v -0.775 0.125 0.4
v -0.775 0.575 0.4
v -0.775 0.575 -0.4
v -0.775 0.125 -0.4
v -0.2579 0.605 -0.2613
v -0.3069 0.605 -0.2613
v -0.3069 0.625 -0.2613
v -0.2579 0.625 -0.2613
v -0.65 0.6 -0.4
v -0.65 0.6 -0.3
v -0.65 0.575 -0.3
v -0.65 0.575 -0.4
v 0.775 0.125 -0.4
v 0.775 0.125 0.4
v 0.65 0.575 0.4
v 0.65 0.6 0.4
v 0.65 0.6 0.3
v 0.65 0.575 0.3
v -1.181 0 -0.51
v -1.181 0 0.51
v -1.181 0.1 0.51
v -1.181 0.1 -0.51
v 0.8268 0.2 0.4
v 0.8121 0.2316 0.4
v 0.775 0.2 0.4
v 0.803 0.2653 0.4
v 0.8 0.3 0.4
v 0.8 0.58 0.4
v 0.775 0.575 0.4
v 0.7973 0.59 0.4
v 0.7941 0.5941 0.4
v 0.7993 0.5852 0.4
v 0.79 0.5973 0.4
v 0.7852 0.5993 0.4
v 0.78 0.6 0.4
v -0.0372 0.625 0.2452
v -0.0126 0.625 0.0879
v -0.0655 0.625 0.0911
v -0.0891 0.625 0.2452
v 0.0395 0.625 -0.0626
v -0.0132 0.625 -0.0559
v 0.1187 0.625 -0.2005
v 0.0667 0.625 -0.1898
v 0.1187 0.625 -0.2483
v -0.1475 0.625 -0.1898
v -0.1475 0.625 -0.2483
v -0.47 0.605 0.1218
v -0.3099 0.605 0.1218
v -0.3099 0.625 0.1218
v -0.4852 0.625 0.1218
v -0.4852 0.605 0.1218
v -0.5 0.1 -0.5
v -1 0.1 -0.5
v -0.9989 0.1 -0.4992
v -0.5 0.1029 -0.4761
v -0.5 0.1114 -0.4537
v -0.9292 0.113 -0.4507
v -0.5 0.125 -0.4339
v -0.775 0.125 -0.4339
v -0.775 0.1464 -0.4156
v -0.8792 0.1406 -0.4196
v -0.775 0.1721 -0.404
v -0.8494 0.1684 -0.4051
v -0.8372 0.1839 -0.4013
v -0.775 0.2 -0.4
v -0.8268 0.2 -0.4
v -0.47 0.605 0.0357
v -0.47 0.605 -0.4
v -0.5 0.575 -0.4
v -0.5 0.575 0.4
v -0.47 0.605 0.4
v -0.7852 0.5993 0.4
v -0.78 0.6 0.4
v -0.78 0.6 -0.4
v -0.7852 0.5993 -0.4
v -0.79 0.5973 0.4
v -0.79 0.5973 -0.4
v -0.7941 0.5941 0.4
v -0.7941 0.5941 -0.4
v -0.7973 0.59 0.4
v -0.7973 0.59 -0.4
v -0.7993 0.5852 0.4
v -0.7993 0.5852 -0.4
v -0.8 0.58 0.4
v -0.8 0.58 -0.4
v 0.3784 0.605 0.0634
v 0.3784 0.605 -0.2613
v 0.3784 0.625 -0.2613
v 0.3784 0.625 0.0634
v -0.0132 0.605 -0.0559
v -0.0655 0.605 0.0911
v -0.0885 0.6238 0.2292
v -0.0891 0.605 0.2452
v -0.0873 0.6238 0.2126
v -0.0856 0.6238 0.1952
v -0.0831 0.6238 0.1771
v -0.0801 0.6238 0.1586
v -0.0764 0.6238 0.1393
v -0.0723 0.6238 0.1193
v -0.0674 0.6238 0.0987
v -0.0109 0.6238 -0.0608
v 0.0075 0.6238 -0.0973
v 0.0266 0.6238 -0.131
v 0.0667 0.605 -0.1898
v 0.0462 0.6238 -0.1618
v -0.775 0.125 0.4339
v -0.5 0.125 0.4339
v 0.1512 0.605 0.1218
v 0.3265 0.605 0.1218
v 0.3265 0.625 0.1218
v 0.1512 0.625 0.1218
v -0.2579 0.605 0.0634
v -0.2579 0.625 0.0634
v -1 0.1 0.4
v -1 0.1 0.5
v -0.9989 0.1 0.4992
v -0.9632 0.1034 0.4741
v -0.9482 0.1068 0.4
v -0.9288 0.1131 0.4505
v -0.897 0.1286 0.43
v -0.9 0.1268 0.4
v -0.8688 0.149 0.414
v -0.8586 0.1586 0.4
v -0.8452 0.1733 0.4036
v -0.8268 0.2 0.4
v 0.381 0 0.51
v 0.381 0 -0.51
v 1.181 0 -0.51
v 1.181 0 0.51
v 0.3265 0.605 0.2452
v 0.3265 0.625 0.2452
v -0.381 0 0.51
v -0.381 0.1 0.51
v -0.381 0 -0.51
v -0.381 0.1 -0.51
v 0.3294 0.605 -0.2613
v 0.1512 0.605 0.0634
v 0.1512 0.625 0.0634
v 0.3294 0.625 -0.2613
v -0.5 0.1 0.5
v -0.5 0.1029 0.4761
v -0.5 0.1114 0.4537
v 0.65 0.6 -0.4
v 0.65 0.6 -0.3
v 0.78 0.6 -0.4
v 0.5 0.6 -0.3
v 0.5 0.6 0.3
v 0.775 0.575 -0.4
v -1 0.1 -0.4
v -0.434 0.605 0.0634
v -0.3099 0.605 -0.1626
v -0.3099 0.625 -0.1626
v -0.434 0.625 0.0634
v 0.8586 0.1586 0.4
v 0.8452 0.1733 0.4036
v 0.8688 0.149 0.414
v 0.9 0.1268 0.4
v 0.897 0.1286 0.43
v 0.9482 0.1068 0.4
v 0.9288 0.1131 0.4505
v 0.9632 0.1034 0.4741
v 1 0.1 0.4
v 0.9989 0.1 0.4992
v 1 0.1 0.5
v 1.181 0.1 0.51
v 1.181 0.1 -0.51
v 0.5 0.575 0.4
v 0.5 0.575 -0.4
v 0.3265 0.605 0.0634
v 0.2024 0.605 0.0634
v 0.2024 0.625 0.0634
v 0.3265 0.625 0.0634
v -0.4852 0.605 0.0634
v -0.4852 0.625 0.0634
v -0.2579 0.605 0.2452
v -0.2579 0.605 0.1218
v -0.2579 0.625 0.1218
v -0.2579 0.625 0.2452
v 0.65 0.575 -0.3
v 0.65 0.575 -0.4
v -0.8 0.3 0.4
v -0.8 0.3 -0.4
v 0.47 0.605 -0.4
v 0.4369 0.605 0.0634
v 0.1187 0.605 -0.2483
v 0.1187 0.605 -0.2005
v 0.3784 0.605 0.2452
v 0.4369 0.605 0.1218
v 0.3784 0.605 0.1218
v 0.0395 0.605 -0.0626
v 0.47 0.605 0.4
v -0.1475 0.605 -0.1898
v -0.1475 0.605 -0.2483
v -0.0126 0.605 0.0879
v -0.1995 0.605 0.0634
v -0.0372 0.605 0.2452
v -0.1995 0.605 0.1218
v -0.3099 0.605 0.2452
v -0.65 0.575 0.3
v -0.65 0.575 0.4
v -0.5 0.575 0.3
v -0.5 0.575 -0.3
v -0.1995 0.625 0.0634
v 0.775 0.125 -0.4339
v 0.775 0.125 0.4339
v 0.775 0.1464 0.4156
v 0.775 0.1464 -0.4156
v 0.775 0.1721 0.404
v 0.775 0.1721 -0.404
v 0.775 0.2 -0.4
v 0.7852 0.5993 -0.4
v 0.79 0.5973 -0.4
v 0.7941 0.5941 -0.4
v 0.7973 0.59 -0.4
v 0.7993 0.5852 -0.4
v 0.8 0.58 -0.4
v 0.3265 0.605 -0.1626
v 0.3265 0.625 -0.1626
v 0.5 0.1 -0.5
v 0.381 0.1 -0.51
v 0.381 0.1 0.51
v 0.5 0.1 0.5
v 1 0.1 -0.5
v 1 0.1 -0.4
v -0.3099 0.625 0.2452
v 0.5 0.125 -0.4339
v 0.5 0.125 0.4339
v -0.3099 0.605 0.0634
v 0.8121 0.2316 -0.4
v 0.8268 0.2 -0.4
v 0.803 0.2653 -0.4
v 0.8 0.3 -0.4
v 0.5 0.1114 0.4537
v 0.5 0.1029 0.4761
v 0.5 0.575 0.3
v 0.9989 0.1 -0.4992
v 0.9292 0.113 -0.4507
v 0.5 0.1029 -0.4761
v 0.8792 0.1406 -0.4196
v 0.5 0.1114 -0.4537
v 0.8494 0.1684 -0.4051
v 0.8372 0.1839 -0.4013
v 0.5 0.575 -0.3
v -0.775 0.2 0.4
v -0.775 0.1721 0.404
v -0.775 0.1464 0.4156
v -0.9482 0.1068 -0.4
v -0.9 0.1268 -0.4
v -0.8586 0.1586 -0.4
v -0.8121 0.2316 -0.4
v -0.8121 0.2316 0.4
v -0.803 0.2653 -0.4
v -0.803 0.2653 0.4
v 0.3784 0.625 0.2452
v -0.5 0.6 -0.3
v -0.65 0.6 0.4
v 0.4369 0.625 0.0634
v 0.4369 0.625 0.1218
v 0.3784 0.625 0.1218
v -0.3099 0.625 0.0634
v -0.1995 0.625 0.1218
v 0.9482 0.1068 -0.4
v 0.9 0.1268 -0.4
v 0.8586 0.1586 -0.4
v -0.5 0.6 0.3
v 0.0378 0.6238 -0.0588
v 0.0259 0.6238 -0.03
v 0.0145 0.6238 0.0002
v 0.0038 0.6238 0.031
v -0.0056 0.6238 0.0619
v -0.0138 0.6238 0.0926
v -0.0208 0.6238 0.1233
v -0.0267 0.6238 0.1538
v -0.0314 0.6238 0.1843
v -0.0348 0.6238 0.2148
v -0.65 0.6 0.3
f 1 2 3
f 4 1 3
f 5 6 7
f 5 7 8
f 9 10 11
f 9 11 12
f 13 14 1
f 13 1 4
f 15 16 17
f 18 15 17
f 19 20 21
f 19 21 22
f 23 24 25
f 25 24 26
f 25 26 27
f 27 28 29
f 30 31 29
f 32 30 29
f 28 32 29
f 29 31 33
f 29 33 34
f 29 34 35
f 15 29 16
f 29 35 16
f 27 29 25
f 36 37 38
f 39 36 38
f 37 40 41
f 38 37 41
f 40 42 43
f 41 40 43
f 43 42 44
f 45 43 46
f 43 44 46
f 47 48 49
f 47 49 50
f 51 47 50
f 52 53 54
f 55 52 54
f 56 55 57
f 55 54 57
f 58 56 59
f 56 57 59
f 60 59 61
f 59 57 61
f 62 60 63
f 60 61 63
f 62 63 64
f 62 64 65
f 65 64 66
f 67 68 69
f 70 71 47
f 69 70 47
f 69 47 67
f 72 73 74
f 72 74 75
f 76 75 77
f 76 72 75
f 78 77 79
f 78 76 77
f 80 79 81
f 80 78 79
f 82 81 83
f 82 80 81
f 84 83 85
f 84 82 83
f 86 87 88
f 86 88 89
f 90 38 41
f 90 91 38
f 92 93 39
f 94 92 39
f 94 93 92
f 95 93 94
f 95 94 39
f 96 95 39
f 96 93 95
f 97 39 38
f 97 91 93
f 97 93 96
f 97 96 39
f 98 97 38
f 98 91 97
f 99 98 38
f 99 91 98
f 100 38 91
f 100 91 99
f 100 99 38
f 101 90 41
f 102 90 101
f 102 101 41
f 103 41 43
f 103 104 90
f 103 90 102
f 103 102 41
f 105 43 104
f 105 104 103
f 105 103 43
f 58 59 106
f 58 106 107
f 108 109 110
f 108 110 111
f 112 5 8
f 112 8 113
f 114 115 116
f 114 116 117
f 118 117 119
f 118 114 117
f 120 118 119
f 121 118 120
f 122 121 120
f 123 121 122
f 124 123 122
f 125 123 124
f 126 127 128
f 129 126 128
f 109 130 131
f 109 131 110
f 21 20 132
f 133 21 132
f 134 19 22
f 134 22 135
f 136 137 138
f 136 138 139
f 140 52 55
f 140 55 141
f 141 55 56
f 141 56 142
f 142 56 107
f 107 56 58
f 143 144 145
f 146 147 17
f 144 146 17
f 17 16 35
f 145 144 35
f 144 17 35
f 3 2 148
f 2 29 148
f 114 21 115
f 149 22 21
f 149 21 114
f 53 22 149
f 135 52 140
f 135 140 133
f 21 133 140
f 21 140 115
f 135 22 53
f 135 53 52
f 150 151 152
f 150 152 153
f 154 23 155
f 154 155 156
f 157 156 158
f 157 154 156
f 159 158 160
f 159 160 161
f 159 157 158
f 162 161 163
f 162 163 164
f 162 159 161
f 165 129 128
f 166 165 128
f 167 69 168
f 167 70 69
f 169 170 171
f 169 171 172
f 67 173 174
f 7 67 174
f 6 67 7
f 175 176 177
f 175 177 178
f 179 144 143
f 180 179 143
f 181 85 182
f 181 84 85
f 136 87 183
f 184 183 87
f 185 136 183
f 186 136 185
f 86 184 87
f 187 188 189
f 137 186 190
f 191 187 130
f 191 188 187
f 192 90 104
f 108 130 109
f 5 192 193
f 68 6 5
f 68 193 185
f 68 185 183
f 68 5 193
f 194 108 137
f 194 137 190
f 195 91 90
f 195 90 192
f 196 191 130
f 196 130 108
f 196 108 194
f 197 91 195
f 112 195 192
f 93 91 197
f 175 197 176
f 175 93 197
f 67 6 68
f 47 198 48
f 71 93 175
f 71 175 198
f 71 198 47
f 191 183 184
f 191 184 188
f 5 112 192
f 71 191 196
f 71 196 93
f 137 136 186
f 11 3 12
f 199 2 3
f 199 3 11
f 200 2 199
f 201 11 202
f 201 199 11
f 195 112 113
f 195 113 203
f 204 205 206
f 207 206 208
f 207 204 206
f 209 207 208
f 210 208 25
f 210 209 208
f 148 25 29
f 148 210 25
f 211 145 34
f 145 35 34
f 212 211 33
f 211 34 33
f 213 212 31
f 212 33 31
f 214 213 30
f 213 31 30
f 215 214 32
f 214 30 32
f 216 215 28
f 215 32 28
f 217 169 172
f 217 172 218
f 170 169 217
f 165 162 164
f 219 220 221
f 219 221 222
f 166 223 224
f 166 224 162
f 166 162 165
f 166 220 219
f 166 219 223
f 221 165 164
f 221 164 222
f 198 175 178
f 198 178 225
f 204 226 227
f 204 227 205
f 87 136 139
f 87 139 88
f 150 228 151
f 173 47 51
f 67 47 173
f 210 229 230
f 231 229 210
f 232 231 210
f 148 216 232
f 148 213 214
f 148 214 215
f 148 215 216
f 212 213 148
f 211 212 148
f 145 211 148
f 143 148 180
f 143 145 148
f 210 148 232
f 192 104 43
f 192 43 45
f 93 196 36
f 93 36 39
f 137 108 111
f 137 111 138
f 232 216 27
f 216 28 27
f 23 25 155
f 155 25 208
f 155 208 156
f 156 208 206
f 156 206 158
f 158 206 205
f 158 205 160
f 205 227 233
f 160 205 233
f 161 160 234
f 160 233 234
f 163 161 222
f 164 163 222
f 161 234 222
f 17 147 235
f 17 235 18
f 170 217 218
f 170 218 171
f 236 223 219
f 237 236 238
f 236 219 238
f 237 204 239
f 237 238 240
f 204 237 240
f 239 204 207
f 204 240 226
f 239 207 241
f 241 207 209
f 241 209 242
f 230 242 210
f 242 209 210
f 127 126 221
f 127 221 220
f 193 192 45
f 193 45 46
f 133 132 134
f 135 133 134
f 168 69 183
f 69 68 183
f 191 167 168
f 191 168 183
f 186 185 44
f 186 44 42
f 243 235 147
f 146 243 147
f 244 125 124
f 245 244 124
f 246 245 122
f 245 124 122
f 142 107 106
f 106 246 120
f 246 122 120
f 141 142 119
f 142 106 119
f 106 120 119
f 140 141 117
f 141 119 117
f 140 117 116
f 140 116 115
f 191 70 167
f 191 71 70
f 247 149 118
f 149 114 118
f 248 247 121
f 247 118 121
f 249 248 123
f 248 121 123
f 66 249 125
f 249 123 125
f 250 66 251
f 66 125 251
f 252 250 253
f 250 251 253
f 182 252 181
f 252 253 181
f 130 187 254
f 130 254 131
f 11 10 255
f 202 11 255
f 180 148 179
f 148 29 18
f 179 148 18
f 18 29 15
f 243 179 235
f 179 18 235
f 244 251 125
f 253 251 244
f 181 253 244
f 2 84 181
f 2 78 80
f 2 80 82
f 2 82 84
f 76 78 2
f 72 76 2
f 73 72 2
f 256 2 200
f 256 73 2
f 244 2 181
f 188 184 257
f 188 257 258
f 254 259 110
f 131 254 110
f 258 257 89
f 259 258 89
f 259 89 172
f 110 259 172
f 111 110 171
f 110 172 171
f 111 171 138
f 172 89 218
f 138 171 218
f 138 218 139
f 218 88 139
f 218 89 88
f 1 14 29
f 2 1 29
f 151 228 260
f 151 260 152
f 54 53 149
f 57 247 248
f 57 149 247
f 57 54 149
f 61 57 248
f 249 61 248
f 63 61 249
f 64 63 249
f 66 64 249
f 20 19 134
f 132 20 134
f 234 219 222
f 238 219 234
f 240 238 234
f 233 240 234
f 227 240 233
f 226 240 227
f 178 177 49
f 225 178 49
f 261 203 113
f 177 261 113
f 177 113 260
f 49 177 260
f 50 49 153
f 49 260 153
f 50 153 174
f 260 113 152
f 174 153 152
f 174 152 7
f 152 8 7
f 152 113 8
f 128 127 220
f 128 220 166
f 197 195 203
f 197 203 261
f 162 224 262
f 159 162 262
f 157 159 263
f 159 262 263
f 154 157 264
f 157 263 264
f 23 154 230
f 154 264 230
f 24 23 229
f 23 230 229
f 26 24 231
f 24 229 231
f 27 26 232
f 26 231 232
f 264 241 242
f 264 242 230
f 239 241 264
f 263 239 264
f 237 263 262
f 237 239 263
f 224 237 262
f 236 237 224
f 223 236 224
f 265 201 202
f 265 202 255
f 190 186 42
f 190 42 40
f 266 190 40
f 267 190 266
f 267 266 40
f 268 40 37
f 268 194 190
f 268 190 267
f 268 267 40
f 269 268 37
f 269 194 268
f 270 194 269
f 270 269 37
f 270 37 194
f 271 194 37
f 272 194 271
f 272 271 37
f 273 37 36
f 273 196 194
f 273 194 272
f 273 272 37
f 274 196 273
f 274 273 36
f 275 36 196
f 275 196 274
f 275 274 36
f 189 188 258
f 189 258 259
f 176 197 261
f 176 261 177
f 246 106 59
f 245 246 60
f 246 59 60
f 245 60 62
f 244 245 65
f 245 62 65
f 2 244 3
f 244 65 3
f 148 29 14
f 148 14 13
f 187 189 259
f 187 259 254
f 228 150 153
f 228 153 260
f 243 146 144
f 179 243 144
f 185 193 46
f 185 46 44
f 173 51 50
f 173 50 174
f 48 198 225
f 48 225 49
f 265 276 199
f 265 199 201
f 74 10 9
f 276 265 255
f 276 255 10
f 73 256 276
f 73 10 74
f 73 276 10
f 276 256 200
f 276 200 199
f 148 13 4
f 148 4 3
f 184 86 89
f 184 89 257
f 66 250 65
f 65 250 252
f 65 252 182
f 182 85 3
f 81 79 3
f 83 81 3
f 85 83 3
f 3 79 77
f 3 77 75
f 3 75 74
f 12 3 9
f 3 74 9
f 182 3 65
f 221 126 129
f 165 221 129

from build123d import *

# Parameters (mm, degrees)
SKETCH1_W             = 0.8
SKETCH1_H             = 0.45
BOSS_EXTRUDE1_DEPTH   = 0.775
BOSS_EXTRUDE2_DEPTH   = 0.4
BOSS_EXTRUDE2_2_DEPTH = 0.4
SKETCH3_W             = 0.15
SKETCH3_H             = 0.1
CUT_EXTRUDE1_DEPTH    = 0.025
BOSS_EXTRUDE3_DEPTH   = 0.4
SKETCH7_W             = 0.8
SKETCH7_H             = 1.02
BOSS_EXTRUDE5_DEPTH   = 0.1
FILLET3_R             = 0.2
FILLET4_R             = 0.2
FILLET5_R             = 0.1
FILLET6_R             = 0.1
BOSS_EXTRU_1_DEPTH    = 0.02


with BuildPart() as part:
    # Sketch1 → Boss-Extrude1 (new, symmetric)
    with BuildSketch(Plane(origin=(0, 0, 0), x_dir=(0, 0, -1), z_dir=(1, 0, 0))):
        with Locations((0, 0.35)):
            Rectangle(SKETCH1_W, SKETCH1_H)
    extrude(amount=BOSS_EXTRUDE1_DEPTH, both=True)


with BuildPart() as body_2:
    # Sketch2 → Boss-Extrude2 (new, symmetric)
    with BuildSketch(Plane.XY):
        with BuildLine():
            Line((-0.5, 0.6), (-0.78, 0.6))
            ThreePointArc((-0.78, 0.6), (-0.794142136, 0.594142136), (-0.8, 0.58))
            Line((-0.8, 0.58), (-0.8, 0.1))
            Line((-0.8, 0.1), (-0.5, 0.1))
            Line((-0.5, 0.1), (-0.5, 0.125))
            Line((-0.5, 0.125), (-0.775, 0.125))
            Line((-0.775, 0.125), (-0.775, 0.575))
            Line((-0.775, 0.575), (-0.5, 0.575))
            Line((-0.5, 0.575), (-0.5, 0.6))
        make_face()
    extrude(amount=BOSS_EXTRUDE2_DEPTH, both=True)


with BuildPart() as body_3:
    # Sketch2 → Boss-Extrude2 2 (new, symmetric)
    with BuildSketch(Plane.XY):
        with BuildLine():
            Line((0.5, 0.575), (0.5, 0.6))
            Line((0.5, 0.6), (0.78, 0.6))
            ThreePointArc((0.78, 0.6), (0.794142136, 0.594142136), (0.8, 0.58))
            Line((0.8, 0.58), (0.8, 0.1))
            Line((0.8, 0.1), (0.5, 0.1))
            Line((0.5, 0.1), (0.5, 0.125))
            Line((0.5, 0.125), (0.775, 0.125))
            Line((0.775, 0.125), (0.775, 0.575))
            Line((0.775, 0.575), (0.5, 0.575))
        make_face()
    extrude(amount=BOSS_EXTRUDE2_2_DEPTH, both=True)


with BuildPart() as cut_extrude1_tool:
    # Sketch3 → Cut-Extrude1 (new body)
    with BuildSketch(Plane(origin=(0, 0.6, 0), x_dir=(1, 0, 0), z_dir=(0, 1, 0))):
        with Locations((-0.575, 0.35)):
            Rectangle(SKETCH3_W, SKETCH3_H)
        with Locations((-0.575, -0.35)):
            Rectangle(SKETCH3_W, SKETCH3_H)
        with Locations((0.575, -0.35)):
            Rectangle(SKETCH3_W, SKETCH3_H)
        with Locations((0.575, 0.35)):
            Rectangle(SKETCH3_W, SKETCH3_H)
    extrude(amount=-CUT_EXTRUDE1_DEPTH)


with BuildPart() as body_2_1:
    add(body_2.part)

    # Cut-Extrude1: cut by cut_extrude1_tool
    add(cut_extrude1_tool.part, mode=Mode.SUBTRACT)



with BuildPart() as body_3_1:
    add(body_3.part)

    # Cut-Extrude1: cut by cut_extrude1_tool
    add(cut_extrude1_tool.part, mode=Mode.SUBTRACT)


with BuildPart() as body_4:
    # Sketch4 → Boss-Extrude3 (new, symmetric)
    with BuildSketch(Plane.XY):
        Polygon((-0.5, 0.575), (0.5, 0.575), (0.47, 0.605), (-0.47, 0.605), align=None)
    extrude(amount=BOSS_EXTRUDE3_DEPTH, both=True)

    # Esquisse2 → Boss.-Extru.1 (add)
    # profile 1 of 3: a face of its own
    with BuildSketch(Plane(origin=(0, 0.605, 0), x_dir=(1, 0, 0), z_dir=(0, 1, 0))):
        Polygon((-0.309886691, -0.245221888), (-0.309886691, -0.121845264), (-0.485211367, -0.121845264), (-0.485211367, -0.063403706), (-0.306944321, 0.261271619), (-0.257938639, 0.261271619), (-0.257938639, -0.063403706), (-0.199497081, -0.063403706), (-0.199497081, -0.121845264), (-0.257938639, -0.121845264), (-0.257938639, -0.245221888), align=None)
        Polygon((-0.309886691, -0.063403706), (-0.309886691, 0.162550028), (-0.433973542, -0.063403706), align=None, mode=Mode.SUBTRACT)
    # profile 2 of 3: a face of its own
    with BuildSketch(Plane(origin=(0, 0.605, 0), x_dir=(1, 0, 0), z_dir=(0, 1, 0))):
        with BuildLine():
            Line((-0.147549029, 0.189843048), (-0.147549029, 0.248284606))
            Line((-0.147549029, 0.248284606), (0.118684737, 0.248284606))
            Line((0.118684737, 0.248284606), (0.118684737, 0.200496457))
            add(Edge.make_bspline(
                [(0.118684737, 0.200496457), (0.11374506, 0.193883112), (0.103690577, 0.180421956), (0.089629665, 0.15888939), (0.075954824, 0.135956865), (0.062653235, 0.111604996), (0.049881166, 0.085755524), (0.037509723, 0.058489528), (0.02565439, 0.029704454), (0.014307924, -0.000233926), (0.003675417, -0.030854621), (-0.005742033, -0.061692329), (-0.013988634, -0.092449334), (-0.020962495, -0.123124227), (-0.026905964, -0.153701204), (-0.031550699, -0.184233606), (-0.035053075, -0.21472856), (-0.036458112, -0.235069144), (-0.037159418, -0.245221888)],
                knots=[0, 0, 0, 0, 0.828235292, 1.685834407, 2.579347319, 3.50739146, 4.469751317, 5.472290501, 6.511687755, 7.593421113, 8.685056077, 9.764080991, 10.828622054, 11.880069368, 12.920502423, 13.954003105, 14.978766756, 16, 16, 16, 16], degree=3))
            Line((-0.037159418, -0.245221888), (-0.08910747, -0.245221888))
            add(Edge.make_bspline(
                [(-0.08910747, -0.245221888), (-0.088946966, -0.239876054), (-0.088619538, -0.228970553), (-0.087305949, -0.2122975), (-0.085650055, -0.194926574), (-0.083168557, -0.176934464), (-0.080118357, -0.158294079), (-0.076411626, -0.13902896), (-0.072322113, -0.11904052), (-0.065773685, -0.091649168), (-0.056543919, -0.057339348), (-0.043279746, -0.016938754), (-0.028326509, 0.022538381), (-0.011308019, 0.060586243), (0.006839864, 0.096834643), (0.025951357, 0.13052881), (0.045471344, 0.161610603), (0.059774471, 0.180599823), (0.066736685, 0.189843048)],
                knots=[0, 0, 0, 0, 0.54755489, 1.117011975, 1.712111195, 2.334110413, 2.976306168, 3.645990646, 4.342828197, 5.06521062, 6.529487471, 7.979439287, 9.417531512, 10.850025522, 12.245424871, 13.566691952, 14.815558909, 16, 16, 16, 16], degree=3))
            Line((0.066736685, 0.189843048), (-0.147549029, 0.189843048))
        make_face()
    # profile 3 of 3: a face of its own
    with BuildSketch(Plane(origin=(0, 0.605, 0), x_dir=(1, 0, 0), z_dir=(0, 1, 0))):
        Polygon((0.326476945, -0.245221888), (0.326476945, -0.121845264), (0.15115227, -0.121845264), (0.15115227, -0.063403706), (0.329419315, 0.261271619), (0.378424997, 0.261271619), (0.378424997, -0.063403706), (0.436866556, -0.063403706), (0.436866556, -0.121845264), (0.378424997, -0.121845264), (0.378424997, -0.245221888), align=None)
        Polygon((0.326476945, -0.063403706), (0.326476945, 0.162550028), (0.202390094, -0.063403706), align=None, mode=Mode.SUBTRACT)
    extrude(amount=BOSS_EXTRU_1_DEPTH)


with BuildPart() as body_2_2:
    add(body_2_1.part)

    add(body_3_1.part)  # Boss-Extrude5 merges body 3
    # Sketch7 → Boss-Extrude5 (add)
    with BuildSketch(Plane(origin=(0, 0, 0), x_dir=(1, 0, 0), z_dir=(0, 1, 0))):
        with Locations((-0.781, 0)):
            Rectangle(SKETCH7_W, SKETCH7_H)
        with Locations((0.781, 0)):
            Rectangle(SKETCH7_W, SKETCH7_H)
    extrude(amount=BOSS_EXTRUDE5_DEPTH)

    # Fillet3
    fillet3_edges = [body_2_2.edges().sort_by_distance(p)[0] for p in [
        (-0.8, 0.1, 0),
    ]]
    fillet(fillet3_edges, radius=FILLET3_R)

    # Fillet4
    fillet4_edges = [body_2_2.edges().sort_by_distance(p)[0] for p in [
        (0.8, 0.1, 0),
    ]]
    fillet(fillet4_edges, radius=FILLET4_R)

    # Fillet5
    fillet5_edges = [body_2_2.edges().sort_by_distance(p)[0] for p in [
        (0.75, 0.1, 0.4),
    ]]
    fillet(fillet5_edges, radius=FILLET5_R)
    fillet5_2_edges = [body_2_2.edges().sort_by_distance(p)[0] for p in [
        (0.75, 0.1, -0.4),
    ]]
    fillet(fillet5_2_edges, radius=FILLET5_R)

    # Fillet6
    fillet6_edges = [body_2_2.edges().sort_by_distance(p)[0] for p in [
        (-0.75, 0.1, -0.4),
    ]]
    fillet(fillet6_edges, radius=FILLET6_R)
    fillet6_2_edges = [body_2_2.edges().sort_by_distance(p)[0] for p in [
        (-0.75, 0.1, 0.4),
    ]]
    fillet(fillet6_2_edges, radius=FILLET6_R)


solid = Compound([part.part, body_4.part, body_2_2.part])
